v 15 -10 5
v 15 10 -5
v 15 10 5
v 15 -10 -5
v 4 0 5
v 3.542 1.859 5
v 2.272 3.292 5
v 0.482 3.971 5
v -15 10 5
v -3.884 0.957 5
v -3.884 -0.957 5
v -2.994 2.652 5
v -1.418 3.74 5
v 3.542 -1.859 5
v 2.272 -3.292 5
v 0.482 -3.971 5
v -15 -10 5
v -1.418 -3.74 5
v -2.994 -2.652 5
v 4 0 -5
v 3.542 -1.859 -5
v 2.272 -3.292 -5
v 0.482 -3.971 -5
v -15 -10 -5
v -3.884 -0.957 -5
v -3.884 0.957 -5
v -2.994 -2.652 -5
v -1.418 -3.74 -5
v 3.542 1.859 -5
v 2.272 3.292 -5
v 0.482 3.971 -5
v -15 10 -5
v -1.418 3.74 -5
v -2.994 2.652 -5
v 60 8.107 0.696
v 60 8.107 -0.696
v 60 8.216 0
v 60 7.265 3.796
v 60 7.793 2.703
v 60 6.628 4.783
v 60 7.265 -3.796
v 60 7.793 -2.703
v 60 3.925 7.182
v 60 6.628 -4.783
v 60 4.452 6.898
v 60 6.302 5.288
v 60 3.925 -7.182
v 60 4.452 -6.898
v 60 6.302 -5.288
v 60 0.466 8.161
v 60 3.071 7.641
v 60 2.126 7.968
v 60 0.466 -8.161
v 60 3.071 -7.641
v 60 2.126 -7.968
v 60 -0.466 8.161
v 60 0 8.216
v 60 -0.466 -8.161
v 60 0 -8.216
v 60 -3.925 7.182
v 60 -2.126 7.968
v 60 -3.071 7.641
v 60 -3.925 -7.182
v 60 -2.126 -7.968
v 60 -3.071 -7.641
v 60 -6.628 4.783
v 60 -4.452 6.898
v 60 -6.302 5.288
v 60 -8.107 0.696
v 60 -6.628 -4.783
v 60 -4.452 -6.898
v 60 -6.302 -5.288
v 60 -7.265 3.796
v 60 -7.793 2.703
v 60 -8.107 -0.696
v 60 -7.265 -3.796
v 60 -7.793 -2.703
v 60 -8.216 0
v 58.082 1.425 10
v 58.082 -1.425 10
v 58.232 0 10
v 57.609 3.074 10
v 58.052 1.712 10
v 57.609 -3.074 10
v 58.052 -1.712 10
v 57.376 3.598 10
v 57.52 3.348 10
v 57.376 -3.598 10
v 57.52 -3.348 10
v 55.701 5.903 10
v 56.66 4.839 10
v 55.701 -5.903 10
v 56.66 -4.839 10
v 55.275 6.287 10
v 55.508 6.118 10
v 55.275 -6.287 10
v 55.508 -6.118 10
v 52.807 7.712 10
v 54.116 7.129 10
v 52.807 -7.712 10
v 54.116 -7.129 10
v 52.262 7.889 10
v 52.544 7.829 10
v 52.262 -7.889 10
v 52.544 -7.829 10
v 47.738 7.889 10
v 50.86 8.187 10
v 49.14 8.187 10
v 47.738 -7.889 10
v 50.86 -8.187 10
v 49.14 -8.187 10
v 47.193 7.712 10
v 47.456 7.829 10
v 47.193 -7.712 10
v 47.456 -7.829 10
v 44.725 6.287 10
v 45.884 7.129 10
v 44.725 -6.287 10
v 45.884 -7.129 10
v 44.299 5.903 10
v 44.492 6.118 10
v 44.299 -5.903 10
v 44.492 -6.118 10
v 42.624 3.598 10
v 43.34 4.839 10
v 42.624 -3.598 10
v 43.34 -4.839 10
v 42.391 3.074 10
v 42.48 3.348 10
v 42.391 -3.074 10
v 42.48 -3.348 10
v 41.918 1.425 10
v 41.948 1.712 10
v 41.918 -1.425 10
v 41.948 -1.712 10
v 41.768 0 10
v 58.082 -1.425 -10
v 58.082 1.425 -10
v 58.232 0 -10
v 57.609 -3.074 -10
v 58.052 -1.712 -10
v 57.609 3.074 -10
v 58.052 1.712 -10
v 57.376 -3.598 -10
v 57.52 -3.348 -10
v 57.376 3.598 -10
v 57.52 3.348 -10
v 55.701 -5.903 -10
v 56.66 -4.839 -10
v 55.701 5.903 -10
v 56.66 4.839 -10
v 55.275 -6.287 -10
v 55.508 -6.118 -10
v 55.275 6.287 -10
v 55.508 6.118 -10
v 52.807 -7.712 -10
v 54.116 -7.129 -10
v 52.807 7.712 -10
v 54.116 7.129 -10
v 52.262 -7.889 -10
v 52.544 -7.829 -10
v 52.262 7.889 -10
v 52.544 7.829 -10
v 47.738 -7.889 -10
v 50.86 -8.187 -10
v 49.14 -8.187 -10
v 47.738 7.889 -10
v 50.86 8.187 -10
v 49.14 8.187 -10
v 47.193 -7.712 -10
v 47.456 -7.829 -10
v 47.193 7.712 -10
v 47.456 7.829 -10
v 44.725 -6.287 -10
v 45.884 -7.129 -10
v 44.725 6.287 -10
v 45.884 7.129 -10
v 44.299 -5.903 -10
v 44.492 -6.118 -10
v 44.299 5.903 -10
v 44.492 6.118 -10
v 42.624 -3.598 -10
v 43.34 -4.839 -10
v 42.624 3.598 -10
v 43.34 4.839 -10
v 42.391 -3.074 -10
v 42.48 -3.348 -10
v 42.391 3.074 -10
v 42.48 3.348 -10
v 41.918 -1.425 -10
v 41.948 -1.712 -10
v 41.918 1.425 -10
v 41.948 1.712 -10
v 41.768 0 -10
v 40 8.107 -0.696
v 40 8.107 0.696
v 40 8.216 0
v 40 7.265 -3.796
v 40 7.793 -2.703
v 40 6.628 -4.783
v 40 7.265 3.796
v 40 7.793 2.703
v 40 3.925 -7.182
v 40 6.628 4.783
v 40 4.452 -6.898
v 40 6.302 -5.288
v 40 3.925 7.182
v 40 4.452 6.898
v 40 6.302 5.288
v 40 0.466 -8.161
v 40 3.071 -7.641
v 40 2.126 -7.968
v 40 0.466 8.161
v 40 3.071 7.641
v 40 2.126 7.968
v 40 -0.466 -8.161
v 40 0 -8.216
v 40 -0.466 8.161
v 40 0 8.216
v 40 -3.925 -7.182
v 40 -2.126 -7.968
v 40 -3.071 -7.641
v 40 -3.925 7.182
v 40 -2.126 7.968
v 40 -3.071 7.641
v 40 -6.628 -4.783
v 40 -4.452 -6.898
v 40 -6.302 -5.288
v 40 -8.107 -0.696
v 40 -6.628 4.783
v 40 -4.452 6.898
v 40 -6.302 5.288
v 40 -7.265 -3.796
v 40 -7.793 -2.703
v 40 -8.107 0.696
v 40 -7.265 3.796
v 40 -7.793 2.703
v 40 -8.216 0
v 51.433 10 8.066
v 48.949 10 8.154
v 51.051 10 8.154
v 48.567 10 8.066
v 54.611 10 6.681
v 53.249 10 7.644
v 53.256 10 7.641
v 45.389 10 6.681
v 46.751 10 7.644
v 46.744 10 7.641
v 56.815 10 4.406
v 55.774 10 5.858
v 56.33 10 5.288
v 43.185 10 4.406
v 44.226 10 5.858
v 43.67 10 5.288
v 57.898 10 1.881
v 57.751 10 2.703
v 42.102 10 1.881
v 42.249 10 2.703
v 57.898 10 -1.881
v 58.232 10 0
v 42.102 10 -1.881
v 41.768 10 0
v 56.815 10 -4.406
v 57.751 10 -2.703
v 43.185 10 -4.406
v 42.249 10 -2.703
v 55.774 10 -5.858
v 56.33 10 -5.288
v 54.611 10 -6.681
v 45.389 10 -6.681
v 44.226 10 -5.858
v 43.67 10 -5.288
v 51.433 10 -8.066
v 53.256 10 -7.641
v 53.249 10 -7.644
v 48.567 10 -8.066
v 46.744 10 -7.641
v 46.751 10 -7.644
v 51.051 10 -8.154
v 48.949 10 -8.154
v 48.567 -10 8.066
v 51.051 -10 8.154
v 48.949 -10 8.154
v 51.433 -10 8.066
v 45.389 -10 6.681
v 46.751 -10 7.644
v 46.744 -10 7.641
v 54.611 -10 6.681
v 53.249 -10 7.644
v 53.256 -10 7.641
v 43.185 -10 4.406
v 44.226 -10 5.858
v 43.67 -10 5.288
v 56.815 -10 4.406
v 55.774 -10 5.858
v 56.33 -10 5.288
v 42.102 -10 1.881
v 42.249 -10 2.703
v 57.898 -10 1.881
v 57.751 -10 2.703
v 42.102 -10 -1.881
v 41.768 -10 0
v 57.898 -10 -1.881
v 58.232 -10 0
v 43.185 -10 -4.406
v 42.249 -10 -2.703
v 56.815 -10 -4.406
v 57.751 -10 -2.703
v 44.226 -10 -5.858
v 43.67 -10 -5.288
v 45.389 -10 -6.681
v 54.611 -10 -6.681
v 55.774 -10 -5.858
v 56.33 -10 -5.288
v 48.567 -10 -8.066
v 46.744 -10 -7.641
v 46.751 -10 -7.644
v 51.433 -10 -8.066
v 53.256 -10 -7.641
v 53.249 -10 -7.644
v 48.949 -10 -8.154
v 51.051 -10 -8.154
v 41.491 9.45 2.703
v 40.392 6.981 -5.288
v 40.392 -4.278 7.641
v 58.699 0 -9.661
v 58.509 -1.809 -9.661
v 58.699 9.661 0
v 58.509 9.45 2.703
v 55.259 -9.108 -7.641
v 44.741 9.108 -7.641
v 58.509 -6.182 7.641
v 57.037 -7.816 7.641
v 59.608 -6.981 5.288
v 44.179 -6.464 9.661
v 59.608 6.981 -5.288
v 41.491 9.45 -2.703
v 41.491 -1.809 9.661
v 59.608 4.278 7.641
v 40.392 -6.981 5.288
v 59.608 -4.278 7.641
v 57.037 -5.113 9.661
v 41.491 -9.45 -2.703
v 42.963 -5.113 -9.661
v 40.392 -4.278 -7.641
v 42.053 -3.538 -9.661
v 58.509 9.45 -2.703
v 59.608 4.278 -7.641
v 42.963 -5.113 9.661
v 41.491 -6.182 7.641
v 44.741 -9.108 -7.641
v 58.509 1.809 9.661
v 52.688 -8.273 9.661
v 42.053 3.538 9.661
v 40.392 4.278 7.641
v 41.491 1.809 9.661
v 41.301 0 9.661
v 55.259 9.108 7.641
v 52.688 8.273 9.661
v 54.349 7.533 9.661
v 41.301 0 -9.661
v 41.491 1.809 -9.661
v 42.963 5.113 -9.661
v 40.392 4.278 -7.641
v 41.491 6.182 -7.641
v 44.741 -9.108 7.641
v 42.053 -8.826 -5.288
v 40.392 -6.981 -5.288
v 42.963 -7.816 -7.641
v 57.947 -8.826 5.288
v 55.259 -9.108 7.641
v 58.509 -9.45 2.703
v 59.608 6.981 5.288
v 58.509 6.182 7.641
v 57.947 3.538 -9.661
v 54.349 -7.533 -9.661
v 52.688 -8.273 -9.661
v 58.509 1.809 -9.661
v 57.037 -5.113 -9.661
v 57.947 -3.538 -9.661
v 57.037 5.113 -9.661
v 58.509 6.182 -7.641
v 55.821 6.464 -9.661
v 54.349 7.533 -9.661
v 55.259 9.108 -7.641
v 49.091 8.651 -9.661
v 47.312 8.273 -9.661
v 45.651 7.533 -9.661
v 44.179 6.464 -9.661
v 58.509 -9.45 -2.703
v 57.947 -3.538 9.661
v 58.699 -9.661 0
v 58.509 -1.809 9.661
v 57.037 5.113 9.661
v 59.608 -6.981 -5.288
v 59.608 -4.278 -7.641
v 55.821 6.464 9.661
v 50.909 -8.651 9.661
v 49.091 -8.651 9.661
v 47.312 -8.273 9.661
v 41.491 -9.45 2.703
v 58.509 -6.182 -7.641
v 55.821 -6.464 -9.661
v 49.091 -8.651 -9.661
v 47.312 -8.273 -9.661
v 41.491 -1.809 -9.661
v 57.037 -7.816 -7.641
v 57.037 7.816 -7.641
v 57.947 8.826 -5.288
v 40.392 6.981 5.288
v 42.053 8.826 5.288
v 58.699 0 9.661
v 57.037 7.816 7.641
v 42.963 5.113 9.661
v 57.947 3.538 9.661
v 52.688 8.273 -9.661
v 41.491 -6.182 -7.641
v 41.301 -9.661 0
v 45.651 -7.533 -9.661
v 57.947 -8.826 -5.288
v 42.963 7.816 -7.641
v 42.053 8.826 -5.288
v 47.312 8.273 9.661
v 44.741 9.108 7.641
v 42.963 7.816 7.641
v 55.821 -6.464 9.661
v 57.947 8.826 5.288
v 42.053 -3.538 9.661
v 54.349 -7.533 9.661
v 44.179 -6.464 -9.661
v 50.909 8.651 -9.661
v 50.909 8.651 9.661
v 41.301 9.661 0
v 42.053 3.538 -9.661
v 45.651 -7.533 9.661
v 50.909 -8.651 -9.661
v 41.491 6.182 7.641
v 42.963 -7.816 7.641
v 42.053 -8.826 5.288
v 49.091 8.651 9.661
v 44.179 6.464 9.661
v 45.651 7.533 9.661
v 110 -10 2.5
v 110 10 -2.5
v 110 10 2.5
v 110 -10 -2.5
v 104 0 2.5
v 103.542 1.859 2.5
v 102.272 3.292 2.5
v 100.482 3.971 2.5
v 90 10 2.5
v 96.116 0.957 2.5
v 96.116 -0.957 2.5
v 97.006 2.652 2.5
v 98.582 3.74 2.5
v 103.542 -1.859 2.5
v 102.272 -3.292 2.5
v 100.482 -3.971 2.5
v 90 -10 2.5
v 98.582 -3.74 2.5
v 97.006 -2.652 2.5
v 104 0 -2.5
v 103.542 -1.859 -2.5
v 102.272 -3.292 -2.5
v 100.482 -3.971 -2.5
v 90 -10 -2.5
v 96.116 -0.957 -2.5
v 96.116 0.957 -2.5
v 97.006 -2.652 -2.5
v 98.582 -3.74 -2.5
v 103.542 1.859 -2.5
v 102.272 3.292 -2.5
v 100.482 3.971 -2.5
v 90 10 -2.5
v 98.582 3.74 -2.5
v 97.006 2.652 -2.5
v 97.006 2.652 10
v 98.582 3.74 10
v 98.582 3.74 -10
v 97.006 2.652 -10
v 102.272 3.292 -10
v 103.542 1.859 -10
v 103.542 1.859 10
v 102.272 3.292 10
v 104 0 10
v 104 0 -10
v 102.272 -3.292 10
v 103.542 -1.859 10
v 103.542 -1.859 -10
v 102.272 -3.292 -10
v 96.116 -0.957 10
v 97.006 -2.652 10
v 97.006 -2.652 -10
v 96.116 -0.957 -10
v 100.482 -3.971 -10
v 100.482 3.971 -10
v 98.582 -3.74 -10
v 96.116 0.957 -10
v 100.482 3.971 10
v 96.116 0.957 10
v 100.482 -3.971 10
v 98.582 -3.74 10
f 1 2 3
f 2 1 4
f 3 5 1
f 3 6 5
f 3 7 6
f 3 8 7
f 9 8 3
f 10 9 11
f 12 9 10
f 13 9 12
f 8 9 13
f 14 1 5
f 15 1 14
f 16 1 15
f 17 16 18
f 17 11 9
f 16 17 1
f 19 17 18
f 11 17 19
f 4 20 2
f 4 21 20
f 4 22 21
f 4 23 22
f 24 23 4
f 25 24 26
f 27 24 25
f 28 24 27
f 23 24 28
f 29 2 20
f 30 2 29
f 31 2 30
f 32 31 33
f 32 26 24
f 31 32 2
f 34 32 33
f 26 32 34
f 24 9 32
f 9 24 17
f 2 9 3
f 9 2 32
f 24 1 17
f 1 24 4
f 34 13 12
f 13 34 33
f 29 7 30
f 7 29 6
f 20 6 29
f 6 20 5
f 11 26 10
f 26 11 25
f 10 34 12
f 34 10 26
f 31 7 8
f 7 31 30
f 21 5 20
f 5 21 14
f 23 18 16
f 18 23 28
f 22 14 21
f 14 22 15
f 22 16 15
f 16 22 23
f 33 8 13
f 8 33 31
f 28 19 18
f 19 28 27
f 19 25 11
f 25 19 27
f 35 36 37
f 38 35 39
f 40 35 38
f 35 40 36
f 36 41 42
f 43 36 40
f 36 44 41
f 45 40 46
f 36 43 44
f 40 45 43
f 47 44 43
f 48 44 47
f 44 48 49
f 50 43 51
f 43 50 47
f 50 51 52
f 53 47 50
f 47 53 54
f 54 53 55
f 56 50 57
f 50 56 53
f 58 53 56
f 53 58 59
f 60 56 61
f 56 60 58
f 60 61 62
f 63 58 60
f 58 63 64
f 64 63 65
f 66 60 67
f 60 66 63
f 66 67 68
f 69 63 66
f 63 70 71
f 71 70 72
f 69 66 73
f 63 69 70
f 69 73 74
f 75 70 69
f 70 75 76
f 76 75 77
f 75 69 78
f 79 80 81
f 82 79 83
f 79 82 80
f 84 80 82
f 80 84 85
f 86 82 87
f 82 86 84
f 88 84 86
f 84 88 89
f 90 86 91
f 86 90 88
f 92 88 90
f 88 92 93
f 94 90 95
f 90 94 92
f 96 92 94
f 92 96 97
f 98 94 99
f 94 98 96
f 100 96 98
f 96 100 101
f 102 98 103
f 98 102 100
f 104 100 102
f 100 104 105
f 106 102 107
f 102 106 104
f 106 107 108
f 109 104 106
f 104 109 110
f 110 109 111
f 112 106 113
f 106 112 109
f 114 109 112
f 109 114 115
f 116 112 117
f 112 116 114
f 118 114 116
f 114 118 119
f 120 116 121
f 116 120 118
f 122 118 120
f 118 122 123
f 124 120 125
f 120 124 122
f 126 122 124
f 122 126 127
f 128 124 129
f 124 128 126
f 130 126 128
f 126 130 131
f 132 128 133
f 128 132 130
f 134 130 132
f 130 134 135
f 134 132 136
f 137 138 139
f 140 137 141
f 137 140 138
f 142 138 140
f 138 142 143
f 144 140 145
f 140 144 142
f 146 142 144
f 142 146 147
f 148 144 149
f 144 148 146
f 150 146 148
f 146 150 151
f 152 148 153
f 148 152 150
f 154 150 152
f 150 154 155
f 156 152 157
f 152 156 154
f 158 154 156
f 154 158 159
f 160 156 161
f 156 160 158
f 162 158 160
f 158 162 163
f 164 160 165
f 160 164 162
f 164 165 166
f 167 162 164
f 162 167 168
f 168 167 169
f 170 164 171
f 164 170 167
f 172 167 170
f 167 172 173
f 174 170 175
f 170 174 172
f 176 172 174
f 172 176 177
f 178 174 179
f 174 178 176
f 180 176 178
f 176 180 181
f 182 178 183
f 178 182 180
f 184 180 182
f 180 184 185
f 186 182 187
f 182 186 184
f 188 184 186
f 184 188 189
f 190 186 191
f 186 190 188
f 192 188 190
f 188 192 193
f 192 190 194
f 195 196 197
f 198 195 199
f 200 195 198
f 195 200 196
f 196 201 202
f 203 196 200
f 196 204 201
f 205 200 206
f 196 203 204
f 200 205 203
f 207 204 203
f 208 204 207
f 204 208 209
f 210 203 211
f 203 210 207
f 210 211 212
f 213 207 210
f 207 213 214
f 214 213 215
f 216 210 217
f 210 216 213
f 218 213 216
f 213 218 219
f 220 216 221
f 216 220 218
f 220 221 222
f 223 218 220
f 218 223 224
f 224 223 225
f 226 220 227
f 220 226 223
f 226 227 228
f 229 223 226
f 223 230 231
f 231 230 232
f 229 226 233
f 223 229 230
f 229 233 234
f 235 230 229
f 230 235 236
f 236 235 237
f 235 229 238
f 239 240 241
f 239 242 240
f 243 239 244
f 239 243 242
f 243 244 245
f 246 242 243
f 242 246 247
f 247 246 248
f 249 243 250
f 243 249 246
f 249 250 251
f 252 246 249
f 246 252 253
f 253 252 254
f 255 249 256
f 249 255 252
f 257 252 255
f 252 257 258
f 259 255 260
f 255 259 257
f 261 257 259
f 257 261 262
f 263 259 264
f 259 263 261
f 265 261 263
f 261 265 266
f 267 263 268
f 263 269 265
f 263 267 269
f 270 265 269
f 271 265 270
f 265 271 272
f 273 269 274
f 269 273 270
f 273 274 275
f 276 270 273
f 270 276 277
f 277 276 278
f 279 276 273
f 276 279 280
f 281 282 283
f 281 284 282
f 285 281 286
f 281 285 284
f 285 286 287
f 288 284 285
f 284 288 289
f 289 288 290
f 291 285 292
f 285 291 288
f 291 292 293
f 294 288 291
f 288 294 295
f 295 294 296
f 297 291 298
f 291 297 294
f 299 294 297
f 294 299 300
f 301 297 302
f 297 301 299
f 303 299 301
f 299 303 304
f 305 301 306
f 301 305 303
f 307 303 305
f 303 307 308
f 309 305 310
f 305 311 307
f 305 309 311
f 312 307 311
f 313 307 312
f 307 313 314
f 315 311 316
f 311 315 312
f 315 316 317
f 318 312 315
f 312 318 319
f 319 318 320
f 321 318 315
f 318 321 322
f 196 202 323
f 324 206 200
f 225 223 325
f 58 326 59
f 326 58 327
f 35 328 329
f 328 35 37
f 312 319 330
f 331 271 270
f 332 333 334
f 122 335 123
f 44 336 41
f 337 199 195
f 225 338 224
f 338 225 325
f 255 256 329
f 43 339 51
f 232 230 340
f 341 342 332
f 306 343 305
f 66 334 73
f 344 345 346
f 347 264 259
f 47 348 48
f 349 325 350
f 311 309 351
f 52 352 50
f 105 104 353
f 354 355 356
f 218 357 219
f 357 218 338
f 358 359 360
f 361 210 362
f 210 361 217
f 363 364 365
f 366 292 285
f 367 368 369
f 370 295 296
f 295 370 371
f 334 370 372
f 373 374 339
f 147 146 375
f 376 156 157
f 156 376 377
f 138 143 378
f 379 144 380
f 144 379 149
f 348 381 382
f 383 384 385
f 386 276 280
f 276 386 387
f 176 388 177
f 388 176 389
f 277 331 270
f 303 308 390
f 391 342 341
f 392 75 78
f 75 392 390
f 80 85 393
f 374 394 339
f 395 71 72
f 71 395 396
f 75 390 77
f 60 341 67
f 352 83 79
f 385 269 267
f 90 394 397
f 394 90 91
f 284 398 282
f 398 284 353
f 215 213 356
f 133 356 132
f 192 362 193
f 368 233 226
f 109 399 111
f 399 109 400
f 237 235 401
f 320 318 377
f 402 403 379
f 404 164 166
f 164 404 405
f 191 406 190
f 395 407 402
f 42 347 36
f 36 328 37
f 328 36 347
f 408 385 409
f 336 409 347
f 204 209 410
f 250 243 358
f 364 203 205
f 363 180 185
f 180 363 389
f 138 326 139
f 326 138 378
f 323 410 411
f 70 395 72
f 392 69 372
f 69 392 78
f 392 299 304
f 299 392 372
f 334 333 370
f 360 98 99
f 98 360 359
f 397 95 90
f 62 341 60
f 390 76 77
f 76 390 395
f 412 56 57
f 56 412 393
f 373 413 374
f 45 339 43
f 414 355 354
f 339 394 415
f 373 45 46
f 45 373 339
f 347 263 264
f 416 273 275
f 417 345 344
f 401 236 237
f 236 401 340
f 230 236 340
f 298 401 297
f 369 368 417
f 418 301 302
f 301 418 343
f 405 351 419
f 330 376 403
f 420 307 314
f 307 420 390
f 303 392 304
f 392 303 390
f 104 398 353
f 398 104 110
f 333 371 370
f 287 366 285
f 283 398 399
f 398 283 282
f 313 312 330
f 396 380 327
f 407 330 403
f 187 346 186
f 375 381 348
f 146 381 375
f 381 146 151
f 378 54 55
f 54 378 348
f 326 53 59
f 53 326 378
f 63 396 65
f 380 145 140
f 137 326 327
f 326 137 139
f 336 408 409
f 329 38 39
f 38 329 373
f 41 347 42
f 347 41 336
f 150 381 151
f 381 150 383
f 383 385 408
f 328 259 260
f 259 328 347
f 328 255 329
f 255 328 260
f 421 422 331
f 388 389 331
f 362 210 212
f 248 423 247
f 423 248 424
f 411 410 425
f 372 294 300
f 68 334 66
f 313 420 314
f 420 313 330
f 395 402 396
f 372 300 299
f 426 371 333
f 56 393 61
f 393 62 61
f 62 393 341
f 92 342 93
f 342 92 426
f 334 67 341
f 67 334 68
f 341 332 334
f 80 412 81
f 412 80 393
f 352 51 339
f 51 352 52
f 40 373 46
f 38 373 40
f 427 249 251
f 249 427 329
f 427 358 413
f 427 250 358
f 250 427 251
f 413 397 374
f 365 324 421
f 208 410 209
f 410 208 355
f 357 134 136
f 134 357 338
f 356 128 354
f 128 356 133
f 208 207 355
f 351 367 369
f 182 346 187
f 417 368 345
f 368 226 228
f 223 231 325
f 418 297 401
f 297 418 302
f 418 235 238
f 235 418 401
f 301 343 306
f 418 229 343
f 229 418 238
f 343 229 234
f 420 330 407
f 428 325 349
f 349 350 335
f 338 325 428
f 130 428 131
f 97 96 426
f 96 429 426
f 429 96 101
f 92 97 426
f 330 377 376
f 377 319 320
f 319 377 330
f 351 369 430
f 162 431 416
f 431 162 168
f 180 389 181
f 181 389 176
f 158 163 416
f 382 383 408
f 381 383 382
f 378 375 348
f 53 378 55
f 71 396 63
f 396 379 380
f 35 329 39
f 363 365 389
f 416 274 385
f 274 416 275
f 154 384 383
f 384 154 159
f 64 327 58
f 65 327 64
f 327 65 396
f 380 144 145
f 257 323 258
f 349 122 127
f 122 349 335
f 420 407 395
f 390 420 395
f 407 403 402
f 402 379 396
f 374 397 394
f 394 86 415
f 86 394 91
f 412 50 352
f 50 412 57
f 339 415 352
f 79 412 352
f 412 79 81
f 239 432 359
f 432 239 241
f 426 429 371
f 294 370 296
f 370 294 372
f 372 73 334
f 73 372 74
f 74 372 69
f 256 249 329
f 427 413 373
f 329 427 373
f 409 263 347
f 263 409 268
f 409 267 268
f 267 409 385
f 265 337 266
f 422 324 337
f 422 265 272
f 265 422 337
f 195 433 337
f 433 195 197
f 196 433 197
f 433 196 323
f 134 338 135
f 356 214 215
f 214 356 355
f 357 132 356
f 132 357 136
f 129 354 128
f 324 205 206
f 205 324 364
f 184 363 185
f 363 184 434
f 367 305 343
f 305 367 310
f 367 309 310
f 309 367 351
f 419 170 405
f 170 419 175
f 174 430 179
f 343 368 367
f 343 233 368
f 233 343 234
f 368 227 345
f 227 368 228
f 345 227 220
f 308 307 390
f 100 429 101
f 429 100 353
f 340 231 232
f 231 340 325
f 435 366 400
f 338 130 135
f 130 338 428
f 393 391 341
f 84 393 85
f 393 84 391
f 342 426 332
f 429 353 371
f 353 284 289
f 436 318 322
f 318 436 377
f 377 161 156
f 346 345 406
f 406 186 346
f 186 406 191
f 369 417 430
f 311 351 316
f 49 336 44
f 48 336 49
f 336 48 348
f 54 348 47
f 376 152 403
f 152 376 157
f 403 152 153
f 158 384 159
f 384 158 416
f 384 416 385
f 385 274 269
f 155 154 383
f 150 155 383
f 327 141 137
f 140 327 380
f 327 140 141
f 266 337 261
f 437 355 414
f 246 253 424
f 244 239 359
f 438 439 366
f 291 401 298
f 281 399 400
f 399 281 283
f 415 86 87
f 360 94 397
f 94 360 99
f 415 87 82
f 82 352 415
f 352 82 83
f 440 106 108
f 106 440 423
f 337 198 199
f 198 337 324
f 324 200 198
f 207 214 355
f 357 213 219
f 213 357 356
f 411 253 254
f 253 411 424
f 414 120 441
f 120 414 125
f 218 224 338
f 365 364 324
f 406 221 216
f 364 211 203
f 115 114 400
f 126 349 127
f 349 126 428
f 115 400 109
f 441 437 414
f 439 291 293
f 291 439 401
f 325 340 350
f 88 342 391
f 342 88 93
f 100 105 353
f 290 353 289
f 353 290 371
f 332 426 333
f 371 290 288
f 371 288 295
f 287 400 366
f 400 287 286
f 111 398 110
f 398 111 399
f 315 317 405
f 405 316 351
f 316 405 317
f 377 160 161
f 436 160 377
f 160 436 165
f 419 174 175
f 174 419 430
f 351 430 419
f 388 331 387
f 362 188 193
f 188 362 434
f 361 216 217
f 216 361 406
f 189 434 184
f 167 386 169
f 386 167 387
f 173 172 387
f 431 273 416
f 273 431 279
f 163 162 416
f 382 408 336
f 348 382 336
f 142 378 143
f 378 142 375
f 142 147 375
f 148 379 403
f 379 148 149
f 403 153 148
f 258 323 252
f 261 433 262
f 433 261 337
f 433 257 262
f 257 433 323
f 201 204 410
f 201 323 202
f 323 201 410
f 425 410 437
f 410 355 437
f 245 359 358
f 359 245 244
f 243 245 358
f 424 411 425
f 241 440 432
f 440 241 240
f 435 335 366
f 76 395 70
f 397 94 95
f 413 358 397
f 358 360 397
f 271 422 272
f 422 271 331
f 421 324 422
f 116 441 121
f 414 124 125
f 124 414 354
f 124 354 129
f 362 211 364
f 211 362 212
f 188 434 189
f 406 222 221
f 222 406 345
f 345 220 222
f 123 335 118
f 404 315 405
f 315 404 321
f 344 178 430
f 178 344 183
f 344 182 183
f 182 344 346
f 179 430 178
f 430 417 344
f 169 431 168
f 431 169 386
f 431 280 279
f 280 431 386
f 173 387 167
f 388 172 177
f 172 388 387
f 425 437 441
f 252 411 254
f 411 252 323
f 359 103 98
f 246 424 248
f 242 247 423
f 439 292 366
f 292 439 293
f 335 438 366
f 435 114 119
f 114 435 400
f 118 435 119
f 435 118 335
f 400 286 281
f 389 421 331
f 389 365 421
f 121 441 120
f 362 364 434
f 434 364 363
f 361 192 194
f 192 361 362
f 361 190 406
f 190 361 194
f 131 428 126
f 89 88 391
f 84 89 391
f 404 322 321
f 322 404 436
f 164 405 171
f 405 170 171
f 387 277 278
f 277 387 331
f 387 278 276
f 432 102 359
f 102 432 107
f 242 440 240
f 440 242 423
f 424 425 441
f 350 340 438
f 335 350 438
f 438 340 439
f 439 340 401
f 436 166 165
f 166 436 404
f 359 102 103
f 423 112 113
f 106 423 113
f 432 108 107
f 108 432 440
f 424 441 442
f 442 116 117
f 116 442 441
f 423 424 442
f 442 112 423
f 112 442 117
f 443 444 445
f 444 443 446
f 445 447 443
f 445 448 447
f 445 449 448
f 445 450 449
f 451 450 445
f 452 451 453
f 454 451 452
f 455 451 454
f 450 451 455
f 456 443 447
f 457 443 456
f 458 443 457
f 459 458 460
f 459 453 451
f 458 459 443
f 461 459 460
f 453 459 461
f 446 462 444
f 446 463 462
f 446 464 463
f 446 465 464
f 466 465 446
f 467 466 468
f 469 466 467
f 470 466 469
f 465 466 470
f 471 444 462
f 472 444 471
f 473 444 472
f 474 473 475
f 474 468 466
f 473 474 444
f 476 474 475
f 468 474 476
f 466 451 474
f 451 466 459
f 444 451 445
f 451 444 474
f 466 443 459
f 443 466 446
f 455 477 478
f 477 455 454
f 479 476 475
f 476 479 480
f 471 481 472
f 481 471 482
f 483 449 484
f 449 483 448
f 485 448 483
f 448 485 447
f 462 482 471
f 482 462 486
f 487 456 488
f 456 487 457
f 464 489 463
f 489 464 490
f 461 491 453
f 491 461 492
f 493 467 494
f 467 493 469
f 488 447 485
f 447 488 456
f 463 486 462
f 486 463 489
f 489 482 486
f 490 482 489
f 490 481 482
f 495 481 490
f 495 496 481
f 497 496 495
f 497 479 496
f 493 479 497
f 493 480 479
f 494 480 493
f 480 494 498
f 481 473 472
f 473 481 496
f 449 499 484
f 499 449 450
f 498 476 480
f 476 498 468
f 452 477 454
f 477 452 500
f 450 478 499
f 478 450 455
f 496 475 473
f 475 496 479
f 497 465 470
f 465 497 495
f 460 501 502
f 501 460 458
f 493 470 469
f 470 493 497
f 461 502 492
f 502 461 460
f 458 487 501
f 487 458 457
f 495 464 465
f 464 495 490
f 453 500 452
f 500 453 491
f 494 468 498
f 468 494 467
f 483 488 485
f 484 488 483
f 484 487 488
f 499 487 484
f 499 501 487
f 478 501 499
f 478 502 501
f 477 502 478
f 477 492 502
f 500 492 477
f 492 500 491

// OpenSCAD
difference() {
    cube([30, 20, 10], center = true);
    cylinder(h = 40, r = 4, center = true);
}
translate([50, 0, 0]) intersection() {
    cube([20, 20, 20], center = true);
    sphere(r = 13);
}
translate([100, 0, 0]) union() {
    cube([20, 20, 5], center = true);
    cylinder(h = 20, r = 4, center = true);
}
